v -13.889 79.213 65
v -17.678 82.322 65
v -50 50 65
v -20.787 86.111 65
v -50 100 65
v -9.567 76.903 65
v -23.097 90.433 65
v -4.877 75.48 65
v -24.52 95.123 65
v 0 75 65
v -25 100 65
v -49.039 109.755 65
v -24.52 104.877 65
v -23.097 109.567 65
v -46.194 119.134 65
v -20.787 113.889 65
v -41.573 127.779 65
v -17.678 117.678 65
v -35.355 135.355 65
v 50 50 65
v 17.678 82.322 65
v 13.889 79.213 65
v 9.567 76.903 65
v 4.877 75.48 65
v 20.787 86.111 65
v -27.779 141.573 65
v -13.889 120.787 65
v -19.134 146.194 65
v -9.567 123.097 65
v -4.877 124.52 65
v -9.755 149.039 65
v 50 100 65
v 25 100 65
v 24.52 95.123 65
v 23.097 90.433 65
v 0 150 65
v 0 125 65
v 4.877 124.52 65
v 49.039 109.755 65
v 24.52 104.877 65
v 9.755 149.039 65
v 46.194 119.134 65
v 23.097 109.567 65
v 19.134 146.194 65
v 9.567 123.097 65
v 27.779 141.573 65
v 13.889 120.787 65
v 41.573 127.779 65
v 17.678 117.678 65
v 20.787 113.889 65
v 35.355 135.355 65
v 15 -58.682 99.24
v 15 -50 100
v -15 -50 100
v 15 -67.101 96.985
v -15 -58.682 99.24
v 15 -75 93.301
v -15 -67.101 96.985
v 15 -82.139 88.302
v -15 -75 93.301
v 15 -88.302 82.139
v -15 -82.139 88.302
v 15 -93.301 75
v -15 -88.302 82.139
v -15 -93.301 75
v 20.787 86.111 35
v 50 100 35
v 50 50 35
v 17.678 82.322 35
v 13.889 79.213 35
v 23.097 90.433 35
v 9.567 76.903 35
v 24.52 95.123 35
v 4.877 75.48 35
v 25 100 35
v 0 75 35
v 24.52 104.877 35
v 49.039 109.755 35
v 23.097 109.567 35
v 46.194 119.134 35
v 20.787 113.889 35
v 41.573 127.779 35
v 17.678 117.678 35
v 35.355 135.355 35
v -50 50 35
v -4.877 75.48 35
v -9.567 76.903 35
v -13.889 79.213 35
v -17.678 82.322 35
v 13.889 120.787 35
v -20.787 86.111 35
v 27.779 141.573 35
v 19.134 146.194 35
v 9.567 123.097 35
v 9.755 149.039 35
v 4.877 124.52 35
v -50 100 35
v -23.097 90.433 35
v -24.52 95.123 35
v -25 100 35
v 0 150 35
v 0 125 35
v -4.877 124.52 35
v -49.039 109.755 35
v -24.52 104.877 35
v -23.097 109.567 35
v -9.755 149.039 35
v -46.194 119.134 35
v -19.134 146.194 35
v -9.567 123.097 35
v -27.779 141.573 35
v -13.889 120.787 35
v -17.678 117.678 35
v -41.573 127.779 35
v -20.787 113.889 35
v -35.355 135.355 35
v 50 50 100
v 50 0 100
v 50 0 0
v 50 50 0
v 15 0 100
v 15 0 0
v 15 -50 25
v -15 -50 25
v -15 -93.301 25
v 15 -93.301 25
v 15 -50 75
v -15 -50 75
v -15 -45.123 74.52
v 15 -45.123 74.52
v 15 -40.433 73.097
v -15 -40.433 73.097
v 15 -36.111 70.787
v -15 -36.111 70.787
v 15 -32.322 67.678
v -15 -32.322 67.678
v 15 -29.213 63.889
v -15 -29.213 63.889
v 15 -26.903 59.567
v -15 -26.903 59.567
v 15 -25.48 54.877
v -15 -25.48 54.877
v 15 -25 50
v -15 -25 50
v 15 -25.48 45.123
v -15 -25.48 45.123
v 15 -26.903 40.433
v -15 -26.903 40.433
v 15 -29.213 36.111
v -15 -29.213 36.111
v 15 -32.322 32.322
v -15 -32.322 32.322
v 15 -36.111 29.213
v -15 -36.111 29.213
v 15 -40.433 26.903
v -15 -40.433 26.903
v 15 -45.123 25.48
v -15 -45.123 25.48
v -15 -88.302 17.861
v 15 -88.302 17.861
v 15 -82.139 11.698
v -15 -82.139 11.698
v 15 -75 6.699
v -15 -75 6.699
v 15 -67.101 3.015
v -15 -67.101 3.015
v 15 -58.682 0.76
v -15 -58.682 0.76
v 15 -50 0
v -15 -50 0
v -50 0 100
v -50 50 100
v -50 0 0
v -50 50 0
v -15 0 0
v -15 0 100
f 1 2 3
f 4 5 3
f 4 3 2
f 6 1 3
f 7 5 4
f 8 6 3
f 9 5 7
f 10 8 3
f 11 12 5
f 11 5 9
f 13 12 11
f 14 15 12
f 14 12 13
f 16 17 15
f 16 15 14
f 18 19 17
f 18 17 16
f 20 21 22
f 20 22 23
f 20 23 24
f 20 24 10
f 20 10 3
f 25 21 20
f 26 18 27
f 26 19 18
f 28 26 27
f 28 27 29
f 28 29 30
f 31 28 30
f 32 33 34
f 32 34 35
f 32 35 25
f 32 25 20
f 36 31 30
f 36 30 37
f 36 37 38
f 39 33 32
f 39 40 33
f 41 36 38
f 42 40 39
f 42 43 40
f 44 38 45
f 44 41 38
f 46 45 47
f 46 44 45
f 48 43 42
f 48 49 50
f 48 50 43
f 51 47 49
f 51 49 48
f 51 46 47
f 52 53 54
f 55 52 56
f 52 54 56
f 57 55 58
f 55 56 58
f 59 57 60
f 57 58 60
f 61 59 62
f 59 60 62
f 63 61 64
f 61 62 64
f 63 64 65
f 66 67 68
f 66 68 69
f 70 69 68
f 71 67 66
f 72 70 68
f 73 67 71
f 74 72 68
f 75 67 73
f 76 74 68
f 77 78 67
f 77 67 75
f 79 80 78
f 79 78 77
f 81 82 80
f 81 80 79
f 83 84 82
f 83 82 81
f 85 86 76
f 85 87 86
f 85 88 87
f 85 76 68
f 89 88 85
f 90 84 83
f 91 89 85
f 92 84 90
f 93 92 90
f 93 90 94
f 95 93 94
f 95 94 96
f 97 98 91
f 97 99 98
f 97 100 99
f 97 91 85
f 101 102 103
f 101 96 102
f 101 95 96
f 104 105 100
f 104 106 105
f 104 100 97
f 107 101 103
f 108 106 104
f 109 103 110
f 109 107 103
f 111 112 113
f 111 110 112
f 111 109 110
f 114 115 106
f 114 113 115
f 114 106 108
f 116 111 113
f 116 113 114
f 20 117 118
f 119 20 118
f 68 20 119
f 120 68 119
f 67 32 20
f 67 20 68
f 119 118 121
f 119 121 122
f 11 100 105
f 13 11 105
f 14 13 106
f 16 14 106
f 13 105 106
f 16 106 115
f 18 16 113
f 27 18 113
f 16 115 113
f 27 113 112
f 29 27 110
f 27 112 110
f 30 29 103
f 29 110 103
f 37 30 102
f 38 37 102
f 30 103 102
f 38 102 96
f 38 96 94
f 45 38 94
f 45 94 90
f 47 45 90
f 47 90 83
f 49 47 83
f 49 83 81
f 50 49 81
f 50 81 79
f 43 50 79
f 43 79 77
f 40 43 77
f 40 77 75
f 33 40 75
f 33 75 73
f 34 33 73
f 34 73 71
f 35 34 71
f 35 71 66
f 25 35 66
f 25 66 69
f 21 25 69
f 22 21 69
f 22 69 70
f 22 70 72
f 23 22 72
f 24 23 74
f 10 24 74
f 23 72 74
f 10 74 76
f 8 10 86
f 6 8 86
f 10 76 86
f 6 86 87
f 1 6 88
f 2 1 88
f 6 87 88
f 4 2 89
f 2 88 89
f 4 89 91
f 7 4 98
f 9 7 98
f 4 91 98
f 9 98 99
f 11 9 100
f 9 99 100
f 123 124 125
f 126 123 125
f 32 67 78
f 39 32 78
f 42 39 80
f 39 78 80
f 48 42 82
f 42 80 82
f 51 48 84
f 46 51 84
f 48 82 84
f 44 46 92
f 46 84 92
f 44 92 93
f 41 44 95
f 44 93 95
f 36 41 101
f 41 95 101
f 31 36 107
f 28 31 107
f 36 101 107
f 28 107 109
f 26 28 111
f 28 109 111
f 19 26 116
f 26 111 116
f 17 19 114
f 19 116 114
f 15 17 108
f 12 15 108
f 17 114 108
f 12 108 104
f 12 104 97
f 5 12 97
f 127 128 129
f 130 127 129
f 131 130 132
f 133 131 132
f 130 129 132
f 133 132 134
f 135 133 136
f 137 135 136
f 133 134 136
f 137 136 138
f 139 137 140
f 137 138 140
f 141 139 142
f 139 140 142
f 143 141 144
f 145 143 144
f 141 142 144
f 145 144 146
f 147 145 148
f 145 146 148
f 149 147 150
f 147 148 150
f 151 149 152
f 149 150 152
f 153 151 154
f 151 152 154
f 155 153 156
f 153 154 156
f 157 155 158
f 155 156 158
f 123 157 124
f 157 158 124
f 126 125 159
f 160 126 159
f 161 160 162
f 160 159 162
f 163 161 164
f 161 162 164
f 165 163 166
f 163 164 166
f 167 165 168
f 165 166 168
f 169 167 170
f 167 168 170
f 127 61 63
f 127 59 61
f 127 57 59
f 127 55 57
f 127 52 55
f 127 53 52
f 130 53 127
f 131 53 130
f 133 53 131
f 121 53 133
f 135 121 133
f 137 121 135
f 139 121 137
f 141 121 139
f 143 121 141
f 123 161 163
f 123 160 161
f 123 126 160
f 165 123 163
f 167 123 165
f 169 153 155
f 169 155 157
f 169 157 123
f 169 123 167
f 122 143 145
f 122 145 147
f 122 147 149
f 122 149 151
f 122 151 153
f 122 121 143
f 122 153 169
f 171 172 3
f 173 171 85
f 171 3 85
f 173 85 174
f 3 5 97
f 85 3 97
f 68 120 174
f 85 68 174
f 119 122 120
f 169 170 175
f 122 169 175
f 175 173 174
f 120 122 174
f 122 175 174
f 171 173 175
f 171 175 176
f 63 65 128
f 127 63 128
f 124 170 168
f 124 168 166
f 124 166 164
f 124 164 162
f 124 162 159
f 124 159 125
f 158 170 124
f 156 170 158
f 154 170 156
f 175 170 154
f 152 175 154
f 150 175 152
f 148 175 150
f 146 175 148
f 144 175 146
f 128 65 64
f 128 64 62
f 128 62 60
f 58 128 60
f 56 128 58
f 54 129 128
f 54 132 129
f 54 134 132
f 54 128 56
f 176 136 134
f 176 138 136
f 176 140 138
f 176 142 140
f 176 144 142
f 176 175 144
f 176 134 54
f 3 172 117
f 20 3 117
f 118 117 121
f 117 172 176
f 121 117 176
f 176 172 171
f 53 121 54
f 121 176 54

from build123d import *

# Parameters (mm, degrees)
SALIENTE_EXTRUIR1_DEPTH     = 100
CORTAR_EXTRUIR4_DEPTH       = 1
CORTAR_EXTRUIR4_DEPTH_BACK  = 35
CORTAR_EXTRUIR5_DEPTH       = 35
CROQUIS10_R                 = 25
CORTAR_EXTRUIR6_DEPTH       = 36
CORTAR_EXTRUIR6_DEPTH_BACK  = 66
CROQUIS12_W                 = 100
CROQUIS12_H                 = 100
CORTAR_EXTRUIR10_DEPTH      = 1
CORTAR_EXTRUIR10_DEPTH_BACK = 101
SALIENTE_EXTRUIR3_DEPTH     = 100
CROQUIS22_W                 = 100
CROQUIS22_H                 = 100
CORTAR_EXTRUIR12_DEPTH      = 35
CROQUIS23_W                 = 100
CROQUIS23_H                 = 100
CORTAR_EXTRUIR13_DEPTH      = 35
CORTAR_EXTRUIR14_DEPTH      = 36
CORTAR_EXTRUIR14_DEPTH_BACK = 66


with BuildPart() as part:
    # Croquis3 → Saliente-Extruir1 (new body)
    with BuildSketch(Plane.XY):
        with BuildLine():
            Line((-50, 100), (-50, -100))
            Line((-50, -100), (50, -100))
            Line((50, -100), (50, 100))
            ThreePointArc((50, 100), (0, 150), (-50, 100))
        make_face()
    extrude(amount=SALIENTE_EXTRUIR1_DEPTH)

    # Croquis8 → Cortar-Extruir4 (cut, two sides)
    with BuildSketch(Plane.XY.offset(100)) as cortar_extruir4_sk:
        with BuildLine():
            Line((-50, 100), (-50, 50))
            Line((-50, 50), (50, 50))
            Line((50, 50), (50, 100))
            ThreePointArc((50, 100), (0, 150), (-50, 100))
        make_face()
    extrude(amount=CORTAR_EXTRUIR4_DEPTH, mode=Mode.SUBTRACT)
    extrude(cortar_extruir4_sk.sketch, amount=-CORTAR_EXTRUIR4_DEPTH_BACK, mode=Mode.SUBTRACT)

    # Croquis9 → Cortar-Extruir5 (cut)
    with BuildSketch(Plane(origin=(0, 0, 0), x_dir=(-1, 0, 0), z_dir=(0, 0, -1))):
        with BuildLine():
            Line((-50, 100), (-50, 50))
            Line((-50, 50), (50, 50))
            Line((50, 50), (50, 100))
            ThreePointArc((50, 100), (0, 150), (-50, 100))
        make_face()
    extrude(amount=-CORTAR_EXTRUIR5_DEPTH, mode=Mode.SUBTRACT)

    # Croquis10 → Cortar-Extruir6 (cut, two sides)
    with BuildSketch(Plane(origin=(0, 0, 35), x_dir=(-1, 0, 0), z_dir=(0, 0, -1))) as cortar_extruir6_sk:
        with Locations((0, 100)):
            Circle(CROQUIS10_R)
    extrude(amount=CORTAR_EXTRUIR6_DEPTH, mode=Mode.SUBTRACT)
    extrude(cortar_extruir6_sk.sketch, amount=-CORTAR_EXTRUIR6_DEPTH_BACK, mode=Mode.SUBTRACT)

    # Croquis12 → Cortar-Extruir10 (cut, two sides)
    with BuildSketch(Plane.ZY.offset(50)) as cortar_extruir10_sk:
        with Locations((50, -50)):
            Rectangle(CROQUIS12_W, CROQUIS12_H)
    extrude(amount=CORTAR_EXTRUIR10_DEPTH, mode=Mode.SUBTRACT)
    extrude(cortar_extruir10_sk.sketch, amount=-CORTAR_EXTRUIR10_DEPTH_BACK, mode=Mode.SUBTRACT)

    # Croquis17 → Saliente-Extruir3 (add)
    with BuildSketch(Plane.ZY.offset(50)):
        with BuildLine():
            Line((0, 0), (100, 0))
            Line((100, 0), (100, -50))
            ThreePointArc((100, -50), (50, -100), (0, -50))
            Line((0, -50), (0, 0))
        make_face()
    extrude(amount=-SALIENTE_EXTRUIR3_DEPTH)

    # Croquis22 → Cortar-Extruir12 (cut)
    with BuildSketch(Plane.ZY.offset(50)):
        with Locations((50, -50)):
            Rectangle(CROQUIS22_W, CROQUIS22_H)
    extrude(amount=-CORTAR_EXTRUIR12_DEPTH, mode=Mode.SUBTRACT)

    # Croquis23 → Cortar-Extruir13 (cut)
    with BuildSketch(Plane(origin=(50, 0, 0), x_dir=(0, 0, -1), z_dir=(1, 0, 0))):
        with Locations((-50, -50)):
            Rectangle(CROQUIS23_W, CROQUIS23_H)
    extrude(amount=-CORTAR_EXTRUIR13_DEPTH, mode=Mode.SUBTRACT)

    # Croquis24 → Cortar-Extruir14 (cut, two sides)
    with BuildSketch(Plane.ZY.offset(15)) as cortar_extruir14_sk:
        with BuildLine():
            Line((25, -50), (25, -110.42880279))
            Line((25, -110.42880279), (75, -110.42880279))
            Line((75, -110.42880279), (75, -50))
            ThreePointArc((75, -50), (50, -25), (25, -50))
        make_face()
    extrude(amount=CORTAR_EXTRUIR14_DEPTH, mode=Mode.SUBTRACT)
    extrude(cortar_extruir14_sk.sketch, amount=-CORTAR_EXTRUIR14_DEPTH_BACK, mode=Mode.SUBTRACT)


solid = part.part
